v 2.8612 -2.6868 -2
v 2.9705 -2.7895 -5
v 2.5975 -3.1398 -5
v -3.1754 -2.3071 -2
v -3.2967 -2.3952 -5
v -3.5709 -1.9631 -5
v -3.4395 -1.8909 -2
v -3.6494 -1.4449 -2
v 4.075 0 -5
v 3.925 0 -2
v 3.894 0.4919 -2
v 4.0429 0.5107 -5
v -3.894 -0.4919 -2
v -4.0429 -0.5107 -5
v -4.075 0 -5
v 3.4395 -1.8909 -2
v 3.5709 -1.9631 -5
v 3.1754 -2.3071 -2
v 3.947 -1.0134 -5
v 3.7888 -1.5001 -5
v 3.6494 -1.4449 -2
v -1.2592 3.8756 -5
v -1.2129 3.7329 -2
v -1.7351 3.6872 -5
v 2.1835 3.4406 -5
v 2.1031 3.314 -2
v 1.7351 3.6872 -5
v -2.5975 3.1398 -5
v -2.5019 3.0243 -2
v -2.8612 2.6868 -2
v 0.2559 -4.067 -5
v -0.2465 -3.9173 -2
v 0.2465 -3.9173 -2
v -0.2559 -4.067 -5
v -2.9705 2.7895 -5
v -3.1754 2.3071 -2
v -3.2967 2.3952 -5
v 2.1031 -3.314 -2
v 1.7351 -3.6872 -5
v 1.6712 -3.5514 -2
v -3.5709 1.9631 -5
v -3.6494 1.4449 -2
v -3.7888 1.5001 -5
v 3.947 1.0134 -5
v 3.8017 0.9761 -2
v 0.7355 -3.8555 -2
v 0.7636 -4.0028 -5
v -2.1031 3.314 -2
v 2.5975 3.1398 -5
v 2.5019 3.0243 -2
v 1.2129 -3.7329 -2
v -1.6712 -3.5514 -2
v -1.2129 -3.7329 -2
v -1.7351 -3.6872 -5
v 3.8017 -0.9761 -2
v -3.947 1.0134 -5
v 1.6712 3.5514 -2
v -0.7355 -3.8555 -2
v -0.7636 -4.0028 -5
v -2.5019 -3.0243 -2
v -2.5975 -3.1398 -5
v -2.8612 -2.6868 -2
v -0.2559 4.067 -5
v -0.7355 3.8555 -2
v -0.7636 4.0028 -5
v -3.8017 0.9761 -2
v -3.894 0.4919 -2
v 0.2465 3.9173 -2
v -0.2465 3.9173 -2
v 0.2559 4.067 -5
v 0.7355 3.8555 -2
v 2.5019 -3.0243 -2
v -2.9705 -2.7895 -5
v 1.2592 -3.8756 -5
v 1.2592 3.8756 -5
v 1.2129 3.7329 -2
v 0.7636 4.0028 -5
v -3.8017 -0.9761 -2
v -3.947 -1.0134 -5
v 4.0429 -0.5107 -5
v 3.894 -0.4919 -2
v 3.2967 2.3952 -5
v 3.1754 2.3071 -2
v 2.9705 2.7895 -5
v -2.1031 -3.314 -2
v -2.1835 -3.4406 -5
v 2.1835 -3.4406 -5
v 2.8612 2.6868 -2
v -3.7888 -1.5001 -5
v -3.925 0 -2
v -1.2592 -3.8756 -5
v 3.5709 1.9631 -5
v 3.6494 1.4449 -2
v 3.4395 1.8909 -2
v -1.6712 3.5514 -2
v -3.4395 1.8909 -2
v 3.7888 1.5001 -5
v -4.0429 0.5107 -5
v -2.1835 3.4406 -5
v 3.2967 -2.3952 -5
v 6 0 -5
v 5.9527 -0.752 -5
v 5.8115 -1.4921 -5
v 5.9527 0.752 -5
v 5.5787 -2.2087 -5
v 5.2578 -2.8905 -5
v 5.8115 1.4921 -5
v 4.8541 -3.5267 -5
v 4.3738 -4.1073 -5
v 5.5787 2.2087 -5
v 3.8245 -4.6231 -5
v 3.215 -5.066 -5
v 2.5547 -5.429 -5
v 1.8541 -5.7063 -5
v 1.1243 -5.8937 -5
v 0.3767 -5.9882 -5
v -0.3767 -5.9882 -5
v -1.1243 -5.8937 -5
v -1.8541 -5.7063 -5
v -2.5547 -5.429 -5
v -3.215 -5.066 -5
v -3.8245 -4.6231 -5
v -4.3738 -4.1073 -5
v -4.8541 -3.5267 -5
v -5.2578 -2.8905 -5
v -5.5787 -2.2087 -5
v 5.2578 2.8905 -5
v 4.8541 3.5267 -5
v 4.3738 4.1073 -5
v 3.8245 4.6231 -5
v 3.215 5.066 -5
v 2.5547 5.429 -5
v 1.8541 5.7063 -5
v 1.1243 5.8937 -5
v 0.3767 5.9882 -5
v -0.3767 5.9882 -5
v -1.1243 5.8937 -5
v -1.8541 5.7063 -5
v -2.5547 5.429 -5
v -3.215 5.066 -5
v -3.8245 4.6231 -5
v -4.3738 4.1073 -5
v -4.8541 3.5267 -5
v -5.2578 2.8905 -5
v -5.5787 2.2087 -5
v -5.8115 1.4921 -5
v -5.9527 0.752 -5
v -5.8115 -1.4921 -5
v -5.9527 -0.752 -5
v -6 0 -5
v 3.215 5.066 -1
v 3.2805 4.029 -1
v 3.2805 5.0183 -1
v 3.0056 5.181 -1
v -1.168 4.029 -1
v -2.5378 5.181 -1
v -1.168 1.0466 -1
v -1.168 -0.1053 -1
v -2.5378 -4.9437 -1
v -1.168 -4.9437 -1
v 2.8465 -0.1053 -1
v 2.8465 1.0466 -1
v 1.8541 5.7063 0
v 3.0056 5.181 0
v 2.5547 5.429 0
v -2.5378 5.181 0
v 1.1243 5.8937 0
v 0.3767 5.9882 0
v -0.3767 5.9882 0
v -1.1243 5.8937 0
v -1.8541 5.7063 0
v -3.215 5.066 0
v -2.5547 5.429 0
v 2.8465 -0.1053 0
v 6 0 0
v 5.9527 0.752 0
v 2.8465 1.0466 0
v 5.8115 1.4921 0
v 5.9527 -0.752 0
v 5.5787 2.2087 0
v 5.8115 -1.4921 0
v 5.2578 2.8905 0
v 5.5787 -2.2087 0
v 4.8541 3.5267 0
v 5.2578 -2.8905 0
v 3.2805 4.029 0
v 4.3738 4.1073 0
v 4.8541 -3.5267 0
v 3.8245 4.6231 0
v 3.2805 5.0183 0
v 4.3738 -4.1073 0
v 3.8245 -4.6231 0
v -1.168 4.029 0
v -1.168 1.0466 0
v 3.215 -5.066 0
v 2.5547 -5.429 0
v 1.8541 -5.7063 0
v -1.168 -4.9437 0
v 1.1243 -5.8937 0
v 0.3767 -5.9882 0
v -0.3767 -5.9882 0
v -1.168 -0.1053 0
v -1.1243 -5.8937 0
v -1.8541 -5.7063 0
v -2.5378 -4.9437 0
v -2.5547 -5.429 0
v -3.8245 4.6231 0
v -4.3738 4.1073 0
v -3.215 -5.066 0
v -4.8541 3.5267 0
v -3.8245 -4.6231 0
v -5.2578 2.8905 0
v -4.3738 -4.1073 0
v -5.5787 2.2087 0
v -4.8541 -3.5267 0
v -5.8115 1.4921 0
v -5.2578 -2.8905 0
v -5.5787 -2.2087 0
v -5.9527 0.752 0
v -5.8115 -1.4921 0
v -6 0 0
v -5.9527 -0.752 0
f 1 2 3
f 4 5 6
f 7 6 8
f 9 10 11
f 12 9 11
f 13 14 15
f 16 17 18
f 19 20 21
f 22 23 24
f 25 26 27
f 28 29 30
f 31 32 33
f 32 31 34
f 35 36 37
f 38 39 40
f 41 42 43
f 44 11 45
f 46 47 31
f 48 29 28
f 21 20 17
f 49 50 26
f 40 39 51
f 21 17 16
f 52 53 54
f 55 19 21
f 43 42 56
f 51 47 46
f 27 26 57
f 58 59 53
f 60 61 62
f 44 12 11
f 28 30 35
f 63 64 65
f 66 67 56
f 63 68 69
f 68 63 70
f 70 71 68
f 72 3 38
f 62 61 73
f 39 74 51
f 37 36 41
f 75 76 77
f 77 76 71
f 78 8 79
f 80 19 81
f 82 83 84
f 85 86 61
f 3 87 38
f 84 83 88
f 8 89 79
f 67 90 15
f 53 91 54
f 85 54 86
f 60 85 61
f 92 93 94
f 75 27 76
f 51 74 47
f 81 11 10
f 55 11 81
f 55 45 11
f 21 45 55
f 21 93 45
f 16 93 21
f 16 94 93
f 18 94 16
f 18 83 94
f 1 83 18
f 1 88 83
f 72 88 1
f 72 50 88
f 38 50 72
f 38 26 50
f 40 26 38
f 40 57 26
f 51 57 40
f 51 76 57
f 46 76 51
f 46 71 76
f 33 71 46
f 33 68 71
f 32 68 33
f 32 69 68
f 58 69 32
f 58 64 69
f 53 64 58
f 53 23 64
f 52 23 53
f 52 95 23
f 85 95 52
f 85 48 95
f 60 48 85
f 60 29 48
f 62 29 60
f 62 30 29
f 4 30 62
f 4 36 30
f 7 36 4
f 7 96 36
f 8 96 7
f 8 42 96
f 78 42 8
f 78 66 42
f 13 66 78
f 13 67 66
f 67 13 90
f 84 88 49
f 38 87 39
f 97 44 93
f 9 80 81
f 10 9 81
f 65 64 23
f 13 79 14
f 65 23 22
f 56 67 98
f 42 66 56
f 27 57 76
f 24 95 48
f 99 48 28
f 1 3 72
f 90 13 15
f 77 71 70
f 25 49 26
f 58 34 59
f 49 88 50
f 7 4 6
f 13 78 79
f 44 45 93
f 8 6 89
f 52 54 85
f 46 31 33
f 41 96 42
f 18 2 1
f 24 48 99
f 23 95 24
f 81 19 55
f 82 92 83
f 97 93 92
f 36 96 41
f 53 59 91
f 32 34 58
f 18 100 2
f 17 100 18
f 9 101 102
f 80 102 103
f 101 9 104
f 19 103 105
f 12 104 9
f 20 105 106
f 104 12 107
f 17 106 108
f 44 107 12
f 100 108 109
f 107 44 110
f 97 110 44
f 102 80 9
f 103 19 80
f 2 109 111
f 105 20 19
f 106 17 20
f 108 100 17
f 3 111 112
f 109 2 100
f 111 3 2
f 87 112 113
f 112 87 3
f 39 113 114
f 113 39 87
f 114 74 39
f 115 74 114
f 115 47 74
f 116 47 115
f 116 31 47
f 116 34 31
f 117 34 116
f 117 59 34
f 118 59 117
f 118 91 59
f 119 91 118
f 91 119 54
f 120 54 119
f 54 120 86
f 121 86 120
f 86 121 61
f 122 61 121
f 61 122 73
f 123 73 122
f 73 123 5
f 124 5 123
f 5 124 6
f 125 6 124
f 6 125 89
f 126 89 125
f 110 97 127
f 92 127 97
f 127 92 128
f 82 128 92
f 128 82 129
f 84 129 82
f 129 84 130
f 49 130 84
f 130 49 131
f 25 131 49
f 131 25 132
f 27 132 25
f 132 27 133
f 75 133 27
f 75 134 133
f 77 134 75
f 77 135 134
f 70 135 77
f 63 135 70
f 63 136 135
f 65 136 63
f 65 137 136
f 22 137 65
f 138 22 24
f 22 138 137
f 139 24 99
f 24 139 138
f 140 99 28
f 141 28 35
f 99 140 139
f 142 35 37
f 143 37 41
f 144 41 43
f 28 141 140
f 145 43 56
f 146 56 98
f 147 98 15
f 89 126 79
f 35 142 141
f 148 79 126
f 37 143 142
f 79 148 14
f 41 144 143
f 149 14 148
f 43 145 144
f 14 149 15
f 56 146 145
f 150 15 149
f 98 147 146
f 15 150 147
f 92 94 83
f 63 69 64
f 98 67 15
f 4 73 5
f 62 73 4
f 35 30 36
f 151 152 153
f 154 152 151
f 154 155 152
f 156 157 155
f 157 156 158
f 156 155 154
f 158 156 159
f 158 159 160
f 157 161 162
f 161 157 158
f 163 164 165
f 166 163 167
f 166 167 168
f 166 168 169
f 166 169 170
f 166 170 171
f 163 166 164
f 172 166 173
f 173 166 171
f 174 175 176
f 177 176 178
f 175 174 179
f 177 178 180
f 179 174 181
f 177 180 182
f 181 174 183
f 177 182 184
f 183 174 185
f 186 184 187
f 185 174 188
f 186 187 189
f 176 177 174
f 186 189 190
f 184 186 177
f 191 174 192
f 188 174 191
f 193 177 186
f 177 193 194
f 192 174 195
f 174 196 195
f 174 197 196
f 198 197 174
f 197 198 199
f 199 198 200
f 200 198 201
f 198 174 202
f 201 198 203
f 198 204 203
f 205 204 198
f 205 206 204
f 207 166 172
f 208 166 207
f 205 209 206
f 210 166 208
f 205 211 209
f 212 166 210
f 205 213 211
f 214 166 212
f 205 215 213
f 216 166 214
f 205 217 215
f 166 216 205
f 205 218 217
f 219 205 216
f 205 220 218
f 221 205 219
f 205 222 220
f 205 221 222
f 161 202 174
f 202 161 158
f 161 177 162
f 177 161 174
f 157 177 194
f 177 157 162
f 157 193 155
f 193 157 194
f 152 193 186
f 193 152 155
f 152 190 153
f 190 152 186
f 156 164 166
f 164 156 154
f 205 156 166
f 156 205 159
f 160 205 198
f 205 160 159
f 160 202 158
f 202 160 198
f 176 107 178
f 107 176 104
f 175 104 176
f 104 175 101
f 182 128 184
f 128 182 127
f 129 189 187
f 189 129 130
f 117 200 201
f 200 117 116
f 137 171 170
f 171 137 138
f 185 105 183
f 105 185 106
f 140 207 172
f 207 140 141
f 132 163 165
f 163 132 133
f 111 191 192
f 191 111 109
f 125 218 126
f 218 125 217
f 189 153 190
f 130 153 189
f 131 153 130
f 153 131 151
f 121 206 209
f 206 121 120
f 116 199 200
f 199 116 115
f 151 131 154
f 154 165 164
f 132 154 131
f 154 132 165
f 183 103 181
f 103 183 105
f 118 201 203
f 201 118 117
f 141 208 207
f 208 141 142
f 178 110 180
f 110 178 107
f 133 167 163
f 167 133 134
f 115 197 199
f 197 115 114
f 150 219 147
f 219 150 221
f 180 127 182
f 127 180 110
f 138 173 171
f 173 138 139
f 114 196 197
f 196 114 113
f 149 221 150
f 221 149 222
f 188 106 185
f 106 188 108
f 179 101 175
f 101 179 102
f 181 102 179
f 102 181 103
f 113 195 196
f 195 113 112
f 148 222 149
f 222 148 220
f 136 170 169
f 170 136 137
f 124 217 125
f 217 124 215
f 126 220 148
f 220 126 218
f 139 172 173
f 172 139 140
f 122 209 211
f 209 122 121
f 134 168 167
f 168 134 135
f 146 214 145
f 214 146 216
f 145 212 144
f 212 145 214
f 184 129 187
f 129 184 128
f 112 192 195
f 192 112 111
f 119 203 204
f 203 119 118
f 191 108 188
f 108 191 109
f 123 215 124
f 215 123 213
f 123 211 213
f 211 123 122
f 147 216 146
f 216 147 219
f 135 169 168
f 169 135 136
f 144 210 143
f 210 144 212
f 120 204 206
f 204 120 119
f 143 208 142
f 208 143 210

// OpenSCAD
$fn = 50;

difference() {
	union() {
		translate(v = [0, 0, -5.0]) {
			cylinder(h = 5, r = 6.0);
		}
	}
	union() {
		#translate(v = [0, 0, -5.0]) {
			cylinder(h = 3, r1 = 4.075, r2 = 3.925);
		}
		translate(v = [0, 0, -1]) {
			linear_extrude(height = 1) {
				text(font = "Impact", halign = "center", size = 10, text = "F", valign = "center");
			}
		}
	}
}
